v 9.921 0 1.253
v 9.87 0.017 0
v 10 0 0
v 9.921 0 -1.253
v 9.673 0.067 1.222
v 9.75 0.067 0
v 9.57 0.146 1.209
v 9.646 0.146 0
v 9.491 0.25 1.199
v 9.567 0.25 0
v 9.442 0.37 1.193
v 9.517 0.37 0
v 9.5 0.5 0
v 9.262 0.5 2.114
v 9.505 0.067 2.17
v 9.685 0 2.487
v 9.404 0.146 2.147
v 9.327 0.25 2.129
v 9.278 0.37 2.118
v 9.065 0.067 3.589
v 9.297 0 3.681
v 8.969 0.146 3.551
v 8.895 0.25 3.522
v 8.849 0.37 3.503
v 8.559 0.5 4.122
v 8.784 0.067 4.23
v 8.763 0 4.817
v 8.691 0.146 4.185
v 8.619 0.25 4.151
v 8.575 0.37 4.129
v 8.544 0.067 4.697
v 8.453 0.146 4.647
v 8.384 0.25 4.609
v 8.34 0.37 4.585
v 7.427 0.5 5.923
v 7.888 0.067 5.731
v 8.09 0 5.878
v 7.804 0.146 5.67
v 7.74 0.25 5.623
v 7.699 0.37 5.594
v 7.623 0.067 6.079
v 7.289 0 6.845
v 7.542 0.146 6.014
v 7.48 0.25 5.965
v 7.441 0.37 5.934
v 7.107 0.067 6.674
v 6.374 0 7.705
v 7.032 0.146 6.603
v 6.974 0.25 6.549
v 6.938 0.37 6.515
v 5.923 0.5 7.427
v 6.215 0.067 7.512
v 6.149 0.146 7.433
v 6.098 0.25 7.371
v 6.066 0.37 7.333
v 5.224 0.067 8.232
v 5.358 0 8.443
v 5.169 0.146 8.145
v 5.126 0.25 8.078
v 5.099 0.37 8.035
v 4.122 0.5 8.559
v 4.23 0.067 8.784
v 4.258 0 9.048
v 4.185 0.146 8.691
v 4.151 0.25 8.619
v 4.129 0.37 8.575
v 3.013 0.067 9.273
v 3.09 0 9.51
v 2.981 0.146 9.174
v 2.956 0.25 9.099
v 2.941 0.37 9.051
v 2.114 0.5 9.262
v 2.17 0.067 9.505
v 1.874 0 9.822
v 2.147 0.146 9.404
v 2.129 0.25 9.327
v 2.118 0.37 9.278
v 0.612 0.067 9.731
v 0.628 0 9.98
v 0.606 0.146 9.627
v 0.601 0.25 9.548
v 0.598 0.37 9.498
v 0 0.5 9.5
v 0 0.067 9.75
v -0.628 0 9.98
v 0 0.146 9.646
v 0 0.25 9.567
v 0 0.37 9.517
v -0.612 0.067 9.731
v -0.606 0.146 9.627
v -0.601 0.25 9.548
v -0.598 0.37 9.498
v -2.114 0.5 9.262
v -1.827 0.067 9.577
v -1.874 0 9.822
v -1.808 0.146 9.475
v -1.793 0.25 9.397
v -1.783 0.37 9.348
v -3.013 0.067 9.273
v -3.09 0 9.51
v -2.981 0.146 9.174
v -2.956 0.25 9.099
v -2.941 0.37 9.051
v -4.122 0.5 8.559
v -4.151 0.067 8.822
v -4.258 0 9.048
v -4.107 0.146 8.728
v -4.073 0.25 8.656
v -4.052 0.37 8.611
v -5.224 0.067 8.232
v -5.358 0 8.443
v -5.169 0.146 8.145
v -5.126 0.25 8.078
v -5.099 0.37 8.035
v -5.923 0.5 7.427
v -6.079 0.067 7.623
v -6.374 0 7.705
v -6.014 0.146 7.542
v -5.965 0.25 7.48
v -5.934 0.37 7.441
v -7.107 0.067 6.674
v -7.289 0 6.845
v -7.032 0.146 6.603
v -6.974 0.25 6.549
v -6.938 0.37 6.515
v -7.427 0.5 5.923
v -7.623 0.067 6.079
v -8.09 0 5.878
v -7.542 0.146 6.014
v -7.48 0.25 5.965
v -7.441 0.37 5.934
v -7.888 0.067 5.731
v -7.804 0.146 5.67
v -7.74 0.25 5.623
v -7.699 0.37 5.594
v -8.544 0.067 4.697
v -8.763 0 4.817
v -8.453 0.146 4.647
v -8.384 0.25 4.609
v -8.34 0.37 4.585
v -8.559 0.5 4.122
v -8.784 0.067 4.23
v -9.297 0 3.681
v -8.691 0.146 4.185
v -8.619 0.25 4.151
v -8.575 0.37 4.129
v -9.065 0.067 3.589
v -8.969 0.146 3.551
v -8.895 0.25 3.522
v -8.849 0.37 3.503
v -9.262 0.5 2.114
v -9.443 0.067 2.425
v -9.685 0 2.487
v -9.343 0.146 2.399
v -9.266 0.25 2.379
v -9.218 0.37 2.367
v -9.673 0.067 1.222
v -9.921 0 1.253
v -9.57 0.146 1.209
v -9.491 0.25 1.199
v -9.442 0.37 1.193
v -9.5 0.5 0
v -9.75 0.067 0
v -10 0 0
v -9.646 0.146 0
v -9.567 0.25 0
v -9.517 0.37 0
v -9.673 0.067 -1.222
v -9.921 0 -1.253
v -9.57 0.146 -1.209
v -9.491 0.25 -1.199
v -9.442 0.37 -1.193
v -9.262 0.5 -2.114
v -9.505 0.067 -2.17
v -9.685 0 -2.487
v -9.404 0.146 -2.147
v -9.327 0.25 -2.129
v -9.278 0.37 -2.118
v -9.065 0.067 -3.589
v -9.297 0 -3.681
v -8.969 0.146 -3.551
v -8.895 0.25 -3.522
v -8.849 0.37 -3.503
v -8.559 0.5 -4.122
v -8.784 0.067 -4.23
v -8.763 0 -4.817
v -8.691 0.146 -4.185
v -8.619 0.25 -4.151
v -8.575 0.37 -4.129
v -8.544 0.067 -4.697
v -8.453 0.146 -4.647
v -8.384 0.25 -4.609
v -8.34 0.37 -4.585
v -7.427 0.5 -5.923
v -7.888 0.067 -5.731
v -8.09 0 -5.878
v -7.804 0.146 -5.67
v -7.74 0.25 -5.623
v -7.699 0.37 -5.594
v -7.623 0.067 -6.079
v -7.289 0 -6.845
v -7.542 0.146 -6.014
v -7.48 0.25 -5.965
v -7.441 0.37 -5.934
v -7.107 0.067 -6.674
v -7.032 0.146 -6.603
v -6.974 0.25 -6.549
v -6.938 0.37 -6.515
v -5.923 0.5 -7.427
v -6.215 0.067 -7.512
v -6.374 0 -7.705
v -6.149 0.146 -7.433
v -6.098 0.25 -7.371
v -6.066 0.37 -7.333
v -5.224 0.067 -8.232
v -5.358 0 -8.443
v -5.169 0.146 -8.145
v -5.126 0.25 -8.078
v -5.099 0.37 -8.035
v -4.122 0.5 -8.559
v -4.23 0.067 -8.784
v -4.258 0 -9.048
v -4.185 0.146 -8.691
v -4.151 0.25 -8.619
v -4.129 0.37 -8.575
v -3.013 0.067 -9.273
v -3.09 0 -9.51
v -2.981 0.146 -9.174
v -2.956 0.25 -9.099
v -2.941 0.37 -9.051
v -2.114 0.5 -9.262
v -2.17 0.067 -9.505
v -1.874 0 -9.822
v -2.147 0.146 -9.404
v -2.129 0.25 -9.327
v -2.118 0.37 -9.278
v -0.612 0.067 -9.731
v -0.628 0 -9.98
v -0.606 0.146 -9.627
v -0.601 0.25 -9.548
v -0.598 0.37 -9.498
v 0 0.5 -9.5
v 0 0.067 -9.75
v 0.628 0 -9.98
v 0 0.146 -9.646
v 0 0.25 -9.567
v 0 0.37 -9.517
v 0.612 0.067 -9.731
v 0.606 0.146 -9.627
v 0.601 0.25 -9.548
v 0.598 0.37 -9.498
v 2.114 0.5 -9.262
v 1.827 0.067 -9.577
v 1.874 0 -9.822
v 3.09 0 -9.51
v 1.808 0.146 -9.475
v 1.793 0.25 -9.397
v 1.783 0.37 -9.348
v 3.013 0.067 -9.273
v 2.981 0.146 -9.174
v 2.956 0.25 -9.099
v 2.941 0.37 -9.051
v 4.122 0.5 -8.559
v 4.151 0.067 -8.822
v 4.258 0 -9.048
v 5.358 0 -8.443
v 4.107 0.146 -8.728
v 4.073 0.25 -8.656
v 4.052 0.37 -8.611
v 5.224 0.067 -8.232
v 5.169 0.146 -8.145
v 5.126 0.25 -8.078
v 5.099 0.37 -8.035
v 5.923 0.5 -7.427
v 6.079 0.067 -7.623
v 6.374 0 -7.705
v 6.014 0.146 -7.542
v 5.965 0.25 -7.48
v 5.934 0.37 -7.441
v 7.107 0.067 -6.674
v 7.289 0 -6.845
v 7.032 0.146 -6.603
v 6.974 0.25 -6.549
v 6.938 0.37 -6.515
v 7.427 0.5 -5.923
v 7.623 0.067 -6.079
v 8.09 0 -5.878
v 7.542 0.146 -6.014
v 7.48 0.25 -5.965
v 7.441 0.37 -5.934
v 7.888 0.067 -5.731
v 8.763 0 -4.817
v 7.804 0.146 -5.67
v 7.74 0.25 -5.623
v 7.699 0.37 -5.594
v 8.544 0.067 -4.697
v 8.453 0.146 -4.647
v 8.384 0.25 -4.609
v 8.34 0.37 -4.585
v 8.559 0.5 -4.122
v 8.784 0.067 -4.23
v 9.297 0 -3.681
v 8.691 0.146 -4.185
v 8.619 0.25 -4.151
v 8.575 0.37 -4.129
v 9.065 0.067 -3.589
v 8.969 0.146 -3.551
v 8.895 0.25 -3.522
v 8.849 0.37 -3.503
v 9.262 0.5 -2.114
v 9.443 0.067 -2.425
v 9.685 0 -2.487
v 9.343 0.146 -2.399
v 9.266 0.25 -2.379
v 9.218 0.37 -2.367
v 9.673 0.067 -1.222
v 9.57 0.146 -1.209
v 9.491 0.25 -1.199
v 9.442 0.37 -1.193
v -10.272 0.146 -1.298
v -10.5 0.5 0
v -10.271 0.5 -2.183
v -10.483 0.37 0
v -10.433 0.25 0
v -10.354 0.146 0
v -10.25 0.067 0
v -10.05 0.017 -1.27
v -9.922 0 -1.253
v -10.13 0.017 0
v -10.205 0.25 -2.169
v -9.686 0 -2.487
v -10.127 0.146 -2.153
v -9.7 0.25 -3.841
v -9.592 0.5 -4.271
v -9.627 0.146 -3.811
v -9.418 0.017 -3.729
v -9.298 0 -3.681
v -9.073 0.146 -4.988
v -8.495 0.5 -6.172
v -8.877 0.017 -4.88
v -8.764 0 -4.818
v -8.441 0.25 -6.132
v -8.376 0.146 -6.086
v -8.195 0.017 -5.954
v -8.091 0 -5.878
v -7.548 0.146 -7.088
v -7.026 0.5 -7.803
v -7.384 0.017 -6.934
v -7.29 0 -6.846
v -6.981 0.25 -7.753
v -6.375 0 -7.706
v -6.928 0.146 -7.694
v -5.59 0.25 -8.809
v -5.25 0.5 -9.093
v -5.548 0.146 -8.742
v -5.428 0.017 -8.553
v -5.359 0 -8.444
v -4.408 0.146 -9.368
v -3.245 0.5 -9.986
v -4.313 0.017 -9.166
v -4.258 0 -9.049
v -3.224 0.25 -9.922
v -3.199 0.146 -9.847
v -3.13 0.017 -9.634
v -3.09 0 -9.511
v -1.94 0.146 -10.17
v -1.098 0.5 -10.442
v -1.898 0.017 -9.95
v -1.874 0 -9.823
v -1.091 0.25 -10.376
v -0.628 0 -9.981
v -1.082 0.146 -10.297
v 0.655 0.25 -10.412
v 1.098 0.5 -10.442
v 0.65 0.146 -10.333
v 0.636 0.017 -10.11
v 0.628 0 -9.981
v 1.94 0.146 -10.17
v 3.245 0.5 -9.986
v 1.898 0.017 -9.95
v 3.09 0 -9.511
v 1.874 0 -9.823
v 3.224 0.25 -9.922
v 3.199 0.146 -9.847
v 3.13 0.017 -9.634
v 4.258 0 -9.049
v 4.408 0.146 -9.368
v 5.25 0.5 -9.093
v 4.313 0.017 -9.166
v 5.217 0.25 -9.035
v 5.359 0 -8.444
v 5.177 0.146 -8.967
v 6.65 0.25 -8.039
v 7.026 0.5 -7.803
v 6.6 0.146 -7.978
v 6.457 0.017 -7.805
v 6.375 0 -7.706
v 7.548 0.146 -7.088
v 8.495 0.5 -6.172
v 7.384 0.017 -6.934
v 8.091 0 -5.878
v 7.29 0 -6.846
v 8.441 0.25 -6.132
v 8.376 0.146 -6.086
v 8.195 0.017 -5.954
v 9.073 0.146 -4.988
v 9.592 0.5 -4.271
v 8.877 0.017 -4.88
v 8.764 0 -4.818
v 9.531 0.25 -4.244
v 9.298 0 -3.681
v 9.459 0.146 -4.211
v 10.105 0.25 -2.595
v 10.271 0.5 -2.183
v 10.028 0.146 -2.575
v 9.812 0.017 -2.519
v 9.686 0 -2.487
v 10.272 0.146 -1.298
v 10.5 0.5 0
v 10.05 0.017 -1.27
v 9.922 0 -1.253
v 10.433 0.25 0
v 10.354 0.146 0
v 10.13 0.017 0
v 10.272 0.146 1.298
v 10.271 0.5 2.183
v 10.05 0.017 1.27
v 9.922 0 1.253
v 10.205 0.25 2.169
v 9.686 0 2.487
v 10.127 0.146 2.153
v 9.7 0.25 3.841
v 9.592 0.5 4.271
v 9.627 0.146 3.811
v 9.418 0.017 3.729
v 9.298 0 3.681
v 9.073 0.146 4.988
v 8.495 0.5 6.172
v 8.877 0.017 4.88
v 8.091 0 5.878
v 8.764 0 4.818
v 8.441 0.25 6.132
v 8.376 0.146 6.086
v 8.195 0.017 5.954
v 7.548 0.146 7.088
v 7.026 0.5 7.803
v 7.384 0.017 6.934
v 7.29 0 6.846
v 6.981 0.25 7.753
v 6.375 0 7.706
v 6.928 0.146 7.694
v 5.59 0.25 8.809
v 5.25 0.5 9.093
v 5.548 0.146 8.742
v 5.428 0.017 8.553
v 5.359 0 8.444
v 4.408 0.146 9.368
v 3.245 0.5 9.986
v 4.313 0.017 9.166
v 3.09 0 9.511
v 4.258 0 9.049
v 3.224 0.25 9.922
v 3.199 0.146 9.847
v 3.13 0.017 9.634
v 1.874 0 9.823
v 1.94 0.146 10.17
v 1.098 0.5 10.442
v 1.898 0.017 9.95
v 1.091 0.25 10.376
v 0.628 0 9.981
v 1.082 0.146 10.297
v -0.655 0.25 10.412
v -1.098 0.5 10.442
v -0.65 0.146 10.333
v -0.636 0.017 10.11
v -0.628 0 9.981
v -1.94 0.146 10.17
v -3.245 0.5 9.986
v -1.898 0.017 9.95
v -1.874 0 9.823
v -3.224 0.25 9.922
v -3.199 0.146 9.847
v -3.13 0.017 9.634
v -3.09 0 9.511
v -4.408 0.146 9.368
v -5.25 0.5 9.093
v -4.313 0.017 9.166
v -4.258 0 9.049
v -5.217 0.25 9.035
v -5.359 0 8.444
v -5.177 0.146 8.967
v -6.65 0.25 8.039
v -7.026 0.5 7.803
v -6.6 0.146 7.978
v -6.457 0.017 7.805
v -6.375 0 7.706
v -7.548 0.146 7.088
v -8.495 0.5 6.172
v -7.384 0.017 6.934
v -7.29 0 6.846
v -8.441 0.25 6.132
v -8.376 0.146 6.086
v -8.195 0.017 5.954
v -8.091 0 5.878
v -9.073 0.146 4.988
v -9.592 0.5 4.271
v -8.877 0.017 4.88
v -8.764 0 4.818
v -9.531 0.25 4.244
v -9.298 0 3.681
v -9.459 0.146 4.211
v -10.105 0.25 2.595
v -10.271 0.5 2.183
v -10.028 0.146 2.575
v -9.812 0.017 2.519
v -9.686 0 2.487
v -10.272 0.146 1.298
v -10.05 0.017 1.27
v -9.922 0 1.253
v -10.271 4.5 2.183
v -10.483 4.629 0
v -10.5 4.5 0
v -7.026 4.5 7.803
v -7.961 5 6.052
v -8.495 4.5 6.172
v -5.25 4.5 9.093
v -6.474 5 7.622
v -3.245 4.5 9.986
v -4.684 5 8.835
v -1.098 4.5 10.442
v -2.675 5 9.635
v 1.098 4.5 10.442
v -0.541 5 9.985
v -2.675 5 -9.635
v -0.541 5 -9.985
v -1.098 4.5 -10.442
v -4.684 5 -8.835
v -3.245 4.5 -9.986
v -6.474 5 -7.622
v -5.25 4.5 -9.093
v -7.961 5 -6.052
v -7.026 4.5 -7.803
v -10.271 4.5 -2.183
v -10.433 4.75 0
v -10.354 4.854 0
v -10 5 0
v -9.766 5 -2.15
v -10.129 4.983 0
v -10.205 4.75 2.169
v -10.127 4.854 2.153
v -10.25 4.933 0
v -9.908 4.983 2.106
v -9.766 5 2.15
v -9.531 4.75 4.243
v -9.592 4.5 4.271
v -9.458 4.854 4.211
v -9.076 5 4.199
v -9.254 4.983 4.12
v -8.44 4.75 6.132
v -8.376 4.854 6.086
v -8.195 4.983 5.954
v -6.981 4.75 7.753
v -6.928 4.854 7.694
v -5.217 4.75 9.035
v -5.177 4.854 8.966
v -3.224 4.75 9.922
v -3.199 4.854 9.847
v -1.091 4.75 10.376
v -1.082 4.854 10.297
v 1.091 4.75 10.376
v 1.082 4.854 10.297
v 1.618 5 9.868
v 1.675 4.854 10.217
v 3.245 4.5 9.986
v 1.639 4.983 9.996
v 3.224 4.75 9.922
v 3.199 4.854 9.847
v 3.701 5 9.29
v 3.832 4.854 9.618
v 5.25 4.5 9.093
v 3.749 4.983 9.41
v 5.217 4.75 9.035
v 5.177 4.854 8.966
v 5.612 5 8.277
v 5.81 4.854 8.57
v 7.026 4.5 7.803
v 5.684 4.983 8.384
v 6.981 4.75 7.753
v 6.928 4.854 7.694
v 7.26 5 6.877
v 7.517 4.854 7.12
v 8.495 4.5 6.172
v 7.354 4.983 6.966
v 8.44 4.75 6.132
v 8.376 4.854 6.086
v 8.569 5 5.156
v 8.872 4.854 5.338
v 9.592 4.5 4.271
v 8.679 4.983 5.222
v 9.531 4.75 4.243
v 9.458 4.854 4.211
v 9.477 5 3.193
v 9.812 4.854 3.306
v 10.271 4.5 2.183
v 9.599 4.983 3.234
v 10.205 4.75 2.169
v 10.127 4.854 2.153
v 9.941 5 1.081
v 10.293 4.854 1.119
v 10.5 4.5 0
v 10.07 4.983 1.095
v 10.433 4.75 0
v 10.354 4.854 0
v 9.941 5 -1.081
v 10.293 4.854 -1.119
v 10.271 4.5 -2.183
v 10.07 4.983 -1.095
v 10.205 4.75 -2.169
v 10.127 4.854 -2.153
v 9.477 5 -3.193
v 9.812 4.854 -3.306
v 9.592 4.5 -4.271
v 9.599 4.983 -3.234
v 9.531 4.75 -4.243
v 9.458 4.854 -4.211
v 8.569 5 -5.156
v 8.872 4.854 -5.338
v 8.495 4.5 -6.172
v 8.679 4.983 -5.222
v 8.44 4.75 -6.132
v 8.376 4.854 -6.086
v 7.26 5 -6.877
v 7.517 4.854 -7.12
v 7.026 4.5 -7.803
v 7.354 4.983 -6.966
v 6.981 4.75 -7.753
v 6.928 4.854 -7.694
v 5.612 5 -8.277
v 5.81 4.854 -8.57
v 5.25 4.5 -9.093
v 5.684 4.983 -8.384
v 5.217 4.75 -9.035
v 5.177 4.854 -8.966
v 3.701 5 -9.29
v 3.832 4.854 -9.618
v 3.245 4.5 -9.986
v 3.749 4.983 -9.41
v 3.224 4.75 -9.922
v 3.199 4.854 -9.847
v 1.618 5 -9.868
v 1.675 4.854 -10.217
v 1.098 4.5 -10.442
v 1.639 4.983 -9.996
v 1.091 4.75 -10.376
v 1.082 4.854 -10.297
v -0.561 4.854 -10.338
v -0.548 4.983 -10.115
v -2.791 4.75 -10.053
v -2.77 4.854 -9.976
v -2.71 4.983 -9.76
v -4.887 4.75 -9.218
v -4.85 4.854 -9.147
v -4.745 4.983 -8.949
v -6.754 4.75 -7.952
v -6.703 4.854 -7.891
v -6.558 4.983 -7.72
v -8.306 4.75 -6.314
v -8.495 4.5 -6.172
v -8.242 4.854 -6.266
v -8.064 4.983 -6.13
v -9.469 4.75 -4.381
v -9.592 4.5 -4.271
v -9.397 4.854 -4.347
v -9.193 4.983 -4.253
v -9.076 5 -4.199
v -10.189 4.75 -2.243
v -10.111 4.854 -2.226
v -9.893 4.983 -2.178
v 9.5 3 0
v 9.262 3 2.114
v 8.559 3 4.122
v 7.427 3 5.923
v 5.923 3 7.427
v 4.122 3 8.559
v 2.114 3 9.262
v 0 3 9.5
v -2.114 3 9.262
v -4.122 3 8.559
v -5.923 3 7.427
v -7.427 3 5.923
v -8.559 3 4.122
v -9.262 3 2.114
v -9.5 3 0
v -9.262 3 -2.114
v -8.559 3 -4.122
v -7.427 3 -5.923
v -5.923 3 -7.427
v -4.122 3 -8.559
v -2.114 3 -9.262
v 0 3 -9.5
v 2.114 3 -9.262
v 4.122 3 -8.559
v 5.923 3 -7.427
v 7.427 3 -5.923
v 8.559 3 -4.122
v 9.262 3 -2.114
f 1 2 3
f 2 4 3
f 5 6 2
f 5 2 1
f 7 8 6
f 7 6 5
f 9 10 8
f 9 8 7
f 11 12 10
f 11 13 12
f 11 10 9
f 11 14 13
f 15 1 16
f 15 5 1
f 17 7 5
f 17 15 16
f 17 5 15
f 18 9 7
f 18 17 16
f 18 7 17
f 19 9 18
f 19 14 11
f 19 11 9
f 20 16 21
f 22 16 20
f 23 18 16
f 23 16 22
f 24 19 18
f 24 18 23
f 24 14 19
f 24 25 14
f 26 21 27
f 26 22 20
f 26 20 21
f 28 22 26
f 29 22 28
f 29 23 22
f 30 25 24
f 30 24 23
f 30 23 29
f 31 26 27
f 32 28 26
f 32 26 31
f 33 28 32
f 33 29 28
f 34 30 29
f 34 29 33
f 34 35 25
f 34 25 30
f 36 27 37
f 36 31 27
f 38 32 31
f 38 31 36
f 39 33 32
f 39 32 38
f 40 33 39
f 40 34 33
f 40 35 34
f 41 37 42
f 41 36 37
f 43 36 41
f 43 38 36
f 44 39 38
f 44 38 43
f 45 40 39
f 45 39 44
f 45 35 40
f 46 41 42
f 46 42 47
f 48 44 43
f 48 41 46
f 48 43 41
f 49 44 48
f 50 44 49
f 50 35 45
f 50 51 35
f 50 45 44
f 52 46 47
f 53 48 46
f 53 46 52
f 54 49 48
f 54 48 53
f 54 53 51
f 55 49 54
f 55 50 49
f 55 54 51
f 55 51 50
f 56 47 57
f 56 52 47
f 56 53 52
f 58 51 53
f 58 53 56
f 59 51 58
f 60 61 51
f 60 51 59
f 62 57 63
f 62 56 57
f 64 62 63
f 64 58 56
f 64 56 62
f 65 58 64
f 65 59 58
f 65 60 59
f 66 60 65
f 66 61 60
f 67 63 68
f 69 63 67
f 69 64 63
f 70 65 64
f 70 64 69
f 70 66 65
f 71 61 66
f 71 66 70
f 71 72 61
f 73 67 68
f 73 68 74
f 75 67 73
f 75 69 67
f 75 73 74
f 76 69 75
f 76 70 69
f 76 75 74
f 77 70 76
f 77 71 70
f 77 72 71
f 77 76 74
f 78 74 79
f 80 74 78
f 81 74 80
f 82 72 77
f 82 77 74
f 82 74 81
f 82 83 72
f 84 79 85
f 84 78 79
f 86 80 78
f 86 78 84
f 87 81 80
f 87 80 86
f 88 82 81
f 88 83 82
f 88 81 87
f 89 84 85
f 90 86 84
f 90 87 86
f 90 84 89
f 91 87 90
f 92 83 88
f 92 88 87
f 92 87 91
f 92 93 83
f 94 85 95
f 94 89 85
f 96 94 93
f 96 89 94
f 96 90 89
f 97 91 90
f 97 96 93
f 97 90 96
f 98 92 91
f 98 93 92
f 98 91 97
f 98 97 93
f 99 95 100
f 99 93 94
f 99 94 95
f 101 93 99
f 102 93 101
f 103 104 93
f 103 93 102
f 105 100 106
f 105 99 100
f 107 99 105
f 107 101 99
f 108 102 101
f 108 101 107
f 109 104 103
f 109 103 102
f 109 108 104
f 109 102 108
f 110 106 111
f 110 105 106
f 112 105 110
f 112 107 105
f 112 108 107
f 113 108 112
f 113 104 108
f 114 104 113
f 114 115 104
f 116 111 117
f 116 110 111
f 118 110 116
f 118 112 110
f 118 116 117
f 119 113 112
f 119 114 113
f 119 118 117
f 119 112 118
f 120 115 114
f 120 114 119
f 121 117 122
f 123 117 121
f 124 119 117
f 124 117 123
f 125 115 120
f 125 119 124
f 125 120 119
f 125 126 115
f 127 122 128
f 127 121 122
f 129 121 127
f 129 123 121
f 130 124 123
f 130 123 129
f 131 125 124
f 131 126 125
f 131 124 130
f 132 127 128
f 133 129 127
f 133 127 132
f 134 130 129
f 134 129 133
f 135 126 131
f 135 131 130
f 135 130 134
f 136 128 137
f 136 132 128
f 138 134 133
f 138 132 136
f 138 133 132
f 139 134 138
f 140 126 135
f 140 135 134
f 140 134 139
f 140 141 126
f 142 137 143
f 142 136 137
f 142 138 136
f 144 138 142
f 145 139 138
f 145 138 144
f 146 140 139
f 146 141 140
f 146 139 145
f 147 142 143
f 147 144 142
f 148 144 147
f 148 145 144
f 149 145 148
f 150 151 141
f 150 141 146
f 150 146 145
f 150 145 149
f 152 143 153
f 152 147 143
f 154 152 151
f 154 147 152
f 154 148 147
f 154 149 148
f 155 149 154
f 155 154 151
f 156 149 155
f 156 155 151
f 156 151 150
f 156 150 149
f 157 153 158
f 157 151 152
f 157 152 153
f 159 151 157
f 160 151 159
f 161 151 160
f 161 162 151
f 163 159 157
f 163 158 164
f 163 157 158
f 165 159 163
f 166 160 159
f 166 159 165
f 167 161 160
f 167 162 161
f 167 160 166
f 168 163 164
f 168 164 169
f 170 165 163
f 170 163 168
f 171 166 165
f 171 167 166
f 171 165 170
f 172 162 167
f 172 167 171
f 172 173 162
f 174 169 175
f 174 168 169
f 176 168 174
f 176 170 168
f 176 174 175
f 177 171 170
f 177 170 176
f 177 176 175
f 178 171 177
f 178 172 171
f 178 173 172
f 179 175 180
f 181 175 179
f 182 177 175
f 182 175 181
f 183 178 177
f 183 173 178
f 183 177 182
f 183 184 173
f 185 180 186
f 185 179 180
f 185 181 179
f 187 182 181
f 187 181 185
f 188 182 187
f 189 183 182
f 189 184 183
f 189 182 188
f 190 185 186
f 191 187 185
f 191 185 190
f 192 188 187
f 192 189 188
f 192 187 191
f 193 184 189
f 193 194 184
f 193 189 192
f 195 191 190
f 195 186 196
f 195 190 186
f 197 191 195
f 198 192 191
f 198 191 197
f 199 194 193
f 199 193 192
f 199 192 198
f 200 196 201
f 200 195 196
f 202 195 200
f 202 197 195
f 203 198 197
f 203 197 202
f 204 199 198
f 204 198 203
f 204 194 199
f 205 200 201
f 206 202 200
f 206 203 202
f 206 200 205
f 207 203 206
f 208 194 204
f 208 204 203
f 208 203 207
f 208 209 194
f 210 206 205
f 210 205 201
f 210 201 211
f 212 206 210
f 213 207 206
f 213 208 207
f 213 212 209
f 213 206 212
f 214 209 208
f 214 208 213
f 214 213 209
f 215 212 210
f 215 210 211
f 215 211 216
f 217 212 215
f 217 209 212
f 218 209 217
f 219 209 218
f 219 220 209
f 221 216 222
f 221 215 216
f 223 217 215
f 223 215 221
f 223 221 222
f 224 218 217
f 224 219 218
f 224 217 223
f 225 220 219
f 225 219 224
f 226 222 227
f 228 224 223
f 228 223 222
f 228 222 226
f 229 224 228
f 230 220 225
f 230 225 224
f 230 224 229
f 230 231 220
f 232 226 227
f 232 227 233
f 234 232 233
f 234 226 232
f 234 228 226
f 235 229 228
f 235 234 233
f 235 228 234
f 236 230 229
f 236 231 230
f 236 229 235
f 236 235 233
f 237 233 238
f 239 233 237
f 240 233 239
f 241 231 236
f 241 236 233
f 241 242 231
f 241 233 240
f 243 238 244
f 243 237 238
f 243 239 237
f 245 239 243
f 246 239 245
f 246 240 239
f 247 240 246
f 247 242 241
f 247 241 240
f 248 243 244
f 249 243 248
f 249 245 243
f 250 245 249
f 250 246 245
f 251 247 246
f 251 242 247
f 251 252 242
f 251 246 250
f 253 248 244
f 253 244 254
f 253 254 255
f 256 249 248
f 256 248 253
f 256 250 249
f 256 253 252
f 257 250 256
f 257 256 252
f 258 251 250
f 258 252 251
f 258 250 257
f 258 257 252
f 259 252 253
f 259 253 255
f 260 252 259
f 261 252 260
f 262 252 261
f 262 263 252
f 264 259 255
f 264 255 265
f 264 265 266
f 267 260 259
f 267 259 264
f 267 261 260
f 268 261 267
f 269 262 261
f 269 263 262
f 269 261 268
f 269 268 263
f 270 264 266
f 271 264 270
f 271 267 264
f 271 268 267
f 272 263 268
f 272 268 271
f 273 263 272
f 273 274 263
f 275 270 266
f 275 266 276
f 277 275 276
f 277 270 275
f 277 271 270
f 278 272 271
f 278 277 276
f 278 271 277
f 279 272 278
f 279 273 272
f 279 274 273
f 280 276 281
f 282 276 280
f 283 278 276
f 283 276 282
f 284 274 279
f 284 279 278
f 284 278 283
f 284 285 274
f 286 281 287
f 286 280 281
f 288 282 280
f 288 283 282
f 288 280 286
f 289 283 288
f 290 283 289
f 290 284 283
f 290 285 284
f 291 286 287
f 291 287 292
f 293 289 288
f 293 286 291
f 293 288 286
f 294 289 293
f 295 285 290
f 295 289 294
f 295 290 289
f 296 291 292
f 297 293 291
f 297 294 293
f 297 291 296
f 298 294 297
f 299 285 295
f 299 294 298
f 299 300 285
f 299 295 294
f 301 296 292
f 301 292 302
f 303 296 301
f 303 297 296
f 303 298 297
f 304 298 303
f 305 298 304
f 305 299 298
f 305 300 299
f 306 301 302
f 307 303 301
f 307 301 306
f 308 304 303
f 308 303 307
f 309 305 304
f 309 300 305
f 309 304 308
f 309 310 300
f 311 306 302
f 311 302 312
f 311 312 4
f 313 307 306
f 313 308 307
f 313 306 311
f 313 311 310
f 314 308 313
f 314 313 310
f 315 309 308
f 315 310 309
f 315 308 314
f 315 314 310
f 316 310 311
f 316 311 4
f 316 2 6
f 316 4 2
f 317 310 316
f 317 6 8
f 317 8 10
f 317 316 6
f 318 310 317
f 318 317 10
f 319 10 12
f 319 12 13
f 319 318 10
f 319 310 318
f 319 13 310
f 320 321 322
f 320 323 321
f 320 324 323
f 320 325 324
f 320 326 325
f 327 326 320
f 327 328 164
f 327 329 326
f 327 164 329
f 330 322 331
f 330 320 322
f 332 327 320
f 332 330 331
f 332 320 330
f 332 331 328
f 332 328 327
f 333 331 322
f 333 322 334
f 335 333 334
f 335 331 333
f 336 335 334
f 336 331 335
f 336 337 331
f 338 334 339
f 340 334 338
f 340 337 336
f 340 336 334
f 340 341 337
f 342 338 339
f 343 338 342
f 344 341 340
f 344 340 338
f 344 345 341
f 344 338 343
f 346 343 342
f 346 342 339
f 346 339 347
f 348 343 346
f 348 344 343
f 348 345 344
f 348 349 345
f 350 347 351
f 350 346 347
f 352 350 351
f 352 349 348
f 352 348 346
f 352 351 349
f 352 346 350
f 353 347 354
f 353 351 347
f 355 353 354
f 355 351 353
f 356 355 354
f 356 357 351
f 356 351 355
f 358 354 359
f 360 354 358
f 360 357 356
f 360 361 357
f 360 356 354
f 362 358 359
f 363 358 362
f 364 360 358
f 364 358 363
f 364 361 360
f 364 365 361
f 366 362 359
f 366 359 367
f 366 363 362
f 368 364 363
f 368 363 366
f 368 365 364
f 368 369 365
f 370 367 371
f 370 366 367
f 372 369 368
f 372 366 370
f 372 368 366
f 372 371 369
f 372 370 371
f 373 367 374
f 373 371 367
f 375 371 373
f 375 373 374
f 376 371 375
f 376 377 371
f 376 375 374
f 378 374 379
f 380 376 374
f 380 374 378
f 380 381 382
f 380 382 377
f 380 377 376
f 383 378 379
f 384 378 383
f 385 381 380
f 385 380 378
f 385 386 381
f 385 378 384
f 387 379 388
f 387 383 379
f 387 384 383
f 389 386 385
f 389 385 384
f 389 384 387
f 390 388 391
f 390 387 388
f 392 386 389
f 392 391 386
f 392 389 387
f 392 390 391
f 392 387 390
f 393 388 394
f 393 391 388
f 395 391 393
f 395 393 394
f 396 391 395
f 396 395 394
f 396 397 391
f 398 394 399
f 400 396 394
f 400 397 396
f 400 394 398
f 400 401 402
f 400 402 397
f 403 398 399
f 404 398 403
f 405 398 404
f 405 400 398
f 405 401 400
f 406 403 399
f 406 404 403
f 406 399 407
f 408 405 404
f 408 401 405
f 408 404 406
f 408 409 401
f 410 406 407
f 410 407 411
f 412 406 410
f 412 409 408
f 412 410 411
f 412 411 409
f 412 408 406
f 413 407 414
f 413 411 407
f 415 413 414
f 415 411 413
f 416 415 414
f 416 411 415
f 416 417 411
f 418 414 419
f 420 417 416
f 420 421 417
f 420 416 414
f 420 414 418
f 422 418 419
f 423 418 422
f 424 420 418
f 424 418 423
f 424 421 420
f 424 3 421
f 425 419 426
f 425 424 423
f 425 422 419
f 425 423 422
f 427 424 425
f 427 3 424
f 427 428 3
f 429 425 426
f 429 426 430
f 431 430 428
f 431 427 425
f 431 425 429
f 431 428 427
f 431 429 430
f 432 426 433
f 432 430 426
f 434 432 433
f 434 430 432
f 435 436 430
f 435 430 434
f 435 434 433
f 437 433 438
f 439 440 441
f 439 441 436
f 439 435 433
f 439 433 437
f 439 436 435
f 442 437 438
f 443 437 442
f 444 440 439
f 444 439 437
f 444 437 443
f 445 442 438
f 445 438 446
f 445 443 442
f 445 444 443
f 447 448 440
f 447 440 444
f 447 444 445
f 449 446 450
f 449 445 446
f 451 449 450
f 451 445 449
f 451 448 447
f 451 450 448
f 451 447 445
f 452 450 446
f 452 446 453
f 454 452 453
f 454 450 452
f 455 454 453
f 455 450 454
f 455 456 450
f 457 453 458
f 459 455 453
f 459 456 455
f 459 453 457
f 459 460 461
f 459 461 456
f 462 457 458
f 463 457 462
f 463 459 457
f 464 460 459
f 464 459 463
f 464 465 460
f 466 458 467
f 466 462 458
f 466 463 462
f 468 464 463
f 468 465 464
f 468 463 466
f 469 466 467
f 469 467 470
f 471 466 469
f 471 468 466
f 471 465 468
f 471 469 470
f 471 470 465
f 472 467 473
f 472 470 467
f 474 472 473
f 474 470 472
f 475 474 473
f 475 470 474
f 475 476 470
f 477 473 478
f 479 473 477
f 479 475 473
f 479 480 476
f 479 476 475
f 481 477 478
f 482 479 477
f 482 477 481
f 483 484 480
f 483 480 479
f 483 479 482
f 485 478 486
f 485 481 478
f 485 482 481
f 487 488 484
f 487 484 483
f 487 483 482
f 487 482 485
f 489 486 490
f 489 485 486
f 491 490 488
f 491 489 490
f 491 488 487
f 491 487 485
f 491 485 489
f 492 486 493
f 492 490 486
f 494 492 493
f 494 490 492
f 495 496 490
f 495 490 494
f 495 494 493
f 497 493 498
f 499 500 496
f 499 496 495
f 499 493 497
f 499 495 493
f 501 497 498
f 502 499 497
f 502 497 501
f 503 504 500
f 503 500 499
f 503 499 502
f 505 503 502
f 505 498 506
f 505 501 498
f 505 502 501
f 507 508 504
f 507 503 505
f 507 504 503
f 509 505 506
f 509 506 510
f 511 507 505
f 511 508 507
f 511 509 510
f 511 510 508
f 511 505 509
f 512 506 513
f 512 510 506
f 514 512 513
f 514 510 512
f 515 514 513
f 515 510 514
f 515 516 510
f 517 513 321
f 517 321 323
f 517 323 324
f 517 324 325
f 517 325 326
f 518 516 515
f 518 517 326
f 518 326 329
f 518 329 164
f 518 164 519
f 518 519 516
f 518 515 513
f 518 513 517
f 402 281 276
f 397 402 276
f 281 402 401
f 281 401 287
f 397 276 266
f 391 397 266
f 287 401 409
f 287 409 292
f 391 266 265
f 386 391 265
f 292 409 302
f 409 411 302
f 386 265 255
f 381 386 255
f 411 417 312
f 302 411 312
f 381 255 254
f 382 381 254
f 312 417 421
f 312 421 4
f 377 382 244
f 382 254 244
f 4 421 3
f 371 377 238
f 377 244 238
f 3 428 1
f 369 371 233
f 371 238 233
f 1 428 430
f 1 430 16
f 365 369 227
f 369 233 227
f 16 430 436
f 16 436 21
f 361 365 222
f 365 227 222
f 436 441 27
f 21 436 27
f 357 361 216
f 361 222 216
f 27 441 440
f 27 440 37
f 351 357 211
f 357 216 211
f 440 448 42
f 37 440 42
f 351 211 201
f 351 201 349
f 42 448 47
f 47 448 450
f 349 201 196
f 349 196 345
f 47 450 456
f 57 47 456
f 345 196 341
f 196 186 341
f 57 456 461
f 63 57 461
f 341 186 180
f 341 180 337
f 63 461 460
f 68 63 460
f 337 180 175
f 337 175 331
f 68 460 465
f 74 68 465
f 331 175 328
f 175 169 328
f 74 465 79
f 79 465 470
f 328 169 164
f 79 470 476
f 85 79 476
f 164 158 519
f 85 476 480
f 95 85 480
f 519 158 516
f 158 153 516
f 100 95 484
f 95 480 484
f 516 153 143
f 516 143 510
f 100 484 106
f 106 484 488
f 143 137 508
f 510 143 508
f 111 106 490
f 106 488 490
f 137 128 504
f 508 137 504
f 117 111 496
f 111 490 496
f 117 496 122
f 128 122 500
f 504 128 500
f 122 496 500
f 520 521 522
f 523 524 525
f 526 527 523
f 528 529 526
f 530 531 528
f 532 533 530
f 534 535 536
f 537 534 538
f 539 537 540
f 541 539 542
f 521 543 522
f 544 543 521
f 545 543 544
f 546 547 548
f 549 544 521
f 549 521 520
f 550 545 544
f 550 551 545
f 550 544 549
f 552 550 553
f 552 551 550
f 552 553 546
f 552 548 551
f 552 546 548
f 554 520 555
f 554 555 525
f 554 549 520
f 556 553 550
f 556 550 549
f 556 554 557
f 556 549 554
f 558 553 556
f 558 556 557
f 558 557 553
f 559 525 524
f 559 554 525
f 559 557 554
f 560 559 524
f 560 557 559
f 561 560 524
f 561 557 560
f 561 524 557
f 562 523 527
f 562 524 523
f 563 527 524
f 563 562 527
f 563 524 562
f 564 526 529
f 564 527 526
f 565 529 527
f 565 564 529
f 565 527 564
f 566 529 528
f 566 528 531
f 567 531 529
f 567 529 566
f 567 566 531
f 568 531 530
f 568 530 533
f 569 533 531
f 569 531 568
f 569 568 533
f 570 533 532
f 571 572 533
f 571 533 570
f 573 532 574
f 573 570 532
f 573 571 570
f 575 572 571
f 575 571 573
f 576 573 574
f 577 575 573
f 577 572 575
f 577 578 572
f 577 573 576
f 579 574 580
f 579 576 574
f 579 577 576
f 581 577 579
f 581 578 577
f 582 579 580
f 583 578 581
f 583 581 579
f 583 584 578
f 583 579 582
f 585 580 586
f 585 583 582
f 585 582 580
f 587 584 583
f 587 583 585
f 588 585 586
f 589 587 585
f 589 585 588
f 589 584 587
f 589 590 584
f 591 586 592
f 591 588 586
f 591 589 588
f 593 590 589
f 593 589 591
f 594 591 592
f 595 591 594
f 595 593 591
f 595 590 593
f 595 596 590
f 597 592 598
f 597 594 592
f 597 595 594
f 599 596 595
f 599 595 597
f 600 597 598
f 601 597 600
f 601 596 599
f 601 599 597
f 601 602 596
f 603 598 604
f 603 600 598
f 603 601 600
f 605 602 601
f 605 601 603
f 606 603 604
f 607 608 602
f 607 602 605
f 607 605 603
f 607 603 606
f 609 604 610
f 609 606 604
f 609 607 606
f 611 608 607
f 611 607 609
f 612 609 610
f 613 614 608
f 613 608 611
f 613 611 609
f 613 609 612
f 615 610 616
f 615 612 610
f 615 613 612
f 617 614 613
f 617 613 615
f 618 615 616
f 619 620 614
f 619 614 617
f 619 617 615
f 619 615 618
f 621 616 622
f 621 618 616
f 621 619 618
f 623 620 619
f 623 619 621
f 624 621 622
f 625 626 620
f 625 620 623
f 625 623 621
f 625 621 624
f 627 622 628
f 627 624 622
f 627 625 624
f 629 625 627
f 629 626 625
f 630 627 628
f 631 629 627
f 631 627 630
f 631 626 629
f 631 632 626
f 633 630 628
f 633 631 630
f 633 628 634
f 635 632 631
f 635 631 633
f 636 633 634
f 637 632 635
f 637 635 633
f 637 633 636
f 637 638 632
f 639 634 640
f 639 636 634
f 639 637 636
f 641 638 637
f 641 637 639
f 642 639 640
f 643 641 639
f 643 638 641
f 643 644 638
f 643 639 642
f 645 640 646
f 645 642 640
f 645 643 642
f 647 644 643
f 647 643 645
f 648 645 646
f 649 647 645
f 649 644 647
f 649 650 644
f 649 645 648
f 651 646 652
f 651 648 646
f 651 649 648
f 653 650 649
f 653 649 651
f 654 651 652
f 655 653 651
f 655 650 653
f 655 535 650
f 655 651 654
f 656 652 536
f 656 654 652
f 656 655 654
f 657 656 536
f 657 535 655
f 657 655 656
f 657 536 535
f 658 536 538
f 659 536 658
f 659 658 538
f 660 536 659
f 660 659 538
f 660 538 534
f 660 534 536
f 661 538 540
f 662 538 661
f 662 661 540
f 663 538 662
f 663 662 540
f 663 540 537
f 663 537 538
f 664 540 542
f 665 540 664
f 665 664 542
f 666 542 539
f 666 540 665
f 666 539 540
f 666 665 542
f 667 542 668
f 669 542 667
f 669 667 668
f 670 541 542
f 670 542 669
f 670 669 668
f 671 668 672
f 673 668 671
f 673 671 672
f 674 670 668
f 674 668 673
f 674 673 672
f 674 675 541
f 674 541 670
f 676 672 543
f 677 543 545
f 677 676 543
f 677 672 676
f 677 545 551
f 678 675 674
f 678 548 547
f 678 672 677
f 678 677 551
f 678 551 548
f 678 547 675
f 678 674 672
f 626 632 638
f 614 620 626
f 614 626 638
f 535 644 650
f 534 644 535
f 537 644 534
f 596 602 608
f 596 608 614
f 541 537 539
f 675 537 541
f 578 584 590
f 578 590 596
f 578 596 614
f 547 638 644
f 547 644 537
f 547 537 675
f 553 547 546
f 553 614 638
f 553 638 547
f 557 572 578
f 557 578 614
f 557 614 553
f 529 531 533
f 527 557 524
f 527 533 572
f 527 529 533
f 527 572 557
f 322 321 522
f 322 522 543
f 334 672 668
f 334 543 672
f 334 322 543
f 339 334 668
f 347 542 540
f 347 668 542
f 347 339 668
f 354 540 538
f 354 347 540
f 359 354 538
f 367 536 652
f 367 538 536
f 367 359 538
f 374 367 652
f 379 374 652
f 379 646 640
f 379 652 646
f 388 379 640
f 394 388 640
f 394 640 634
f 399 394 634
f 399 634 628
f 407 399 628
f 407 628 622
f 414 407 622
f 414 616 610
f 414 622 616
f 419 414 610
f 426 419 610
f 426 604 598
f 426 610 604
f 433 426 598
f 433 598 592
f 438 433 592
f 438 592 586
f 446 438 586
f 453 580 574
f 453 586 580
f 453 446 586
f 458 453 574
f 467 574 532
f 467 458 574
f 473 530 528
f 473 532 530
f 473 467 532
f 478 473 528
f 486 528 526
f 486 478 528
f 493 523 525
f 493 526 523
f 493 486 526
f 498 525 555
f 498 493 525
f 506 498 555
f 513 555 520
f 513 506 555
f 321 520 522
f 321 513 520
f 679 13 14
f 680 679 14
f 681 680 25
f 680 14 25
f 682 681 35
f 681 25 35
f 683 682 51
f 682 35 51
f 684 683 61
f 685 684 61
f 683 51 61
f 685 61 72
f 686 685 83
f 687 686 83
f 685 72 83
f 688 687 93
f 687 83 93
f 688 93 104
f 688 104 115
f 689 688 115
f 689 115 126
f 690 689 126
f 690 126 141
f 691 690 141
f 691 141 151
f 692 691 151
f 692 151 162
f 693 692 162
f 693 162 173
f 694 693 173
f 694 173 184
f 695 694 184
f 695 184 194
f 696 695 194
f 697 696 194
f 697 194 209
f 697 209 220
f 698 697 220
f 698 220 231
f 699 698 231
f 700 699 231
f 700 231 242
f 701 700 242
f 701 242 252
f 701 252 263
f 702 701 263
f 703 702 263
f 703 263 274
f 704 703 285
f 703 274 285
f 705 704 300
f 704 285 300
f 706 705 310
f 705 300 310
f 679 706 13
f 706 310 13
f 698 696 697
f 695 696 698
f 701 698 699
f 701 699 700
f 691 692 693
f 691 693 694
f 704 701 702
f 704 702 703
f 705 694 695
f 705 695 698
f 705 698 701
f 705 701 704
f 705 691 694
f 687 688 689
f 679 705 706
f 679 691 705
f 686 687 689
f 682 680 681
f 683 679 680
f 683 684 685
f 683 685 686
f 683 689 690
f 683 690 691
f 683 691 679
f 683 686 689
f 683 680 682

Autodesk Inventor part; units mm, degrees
ref_plane "YZ Plane" through (0, 0, 0) normal (1, 0, 0) x (0, 1, 0)
ref_plane "XZ Plane" through (0, 0, 0) normal (0, 1, 0) x (-1, 0, 0)
ref_plane "XY Plane" through (0, 0, 0) normal (0, 0, 1) x (1, 0, 0)
sketch "Sketch1" plane through (0, 0, 0) normal (0, 1, 0) x (-1, 0, 0)
  circle A0 centre (0, 0) radius 9.5
  circle A1 centre (0, 0) radius 10.5
  dimension "d0" = 19
  dimension "d1" = 21
extrude "Extrusion1" add sketch "Sketch1" along normal blind 5 contours A0 | A1
sketch "Sketch2" plane through (0, 0, 0) normal (0, -1, 0) x (1, 0, 0)
  circle A0 centre (0, 0) radius 9.5
  dimension "d4" = 19
extrude "Extrusion2" cut sketch "Sketch2" against normal blind 3
fillet "Fillet1" radius 0.5 1 edges at (10.5, 5, 0)
fillet "Fillet2" radius 0.5 2 edges at (-9.5, 0, 0) (10.5, 0, 0)
properties part number "Tapa Mirilla" material "LCP Plastic"
